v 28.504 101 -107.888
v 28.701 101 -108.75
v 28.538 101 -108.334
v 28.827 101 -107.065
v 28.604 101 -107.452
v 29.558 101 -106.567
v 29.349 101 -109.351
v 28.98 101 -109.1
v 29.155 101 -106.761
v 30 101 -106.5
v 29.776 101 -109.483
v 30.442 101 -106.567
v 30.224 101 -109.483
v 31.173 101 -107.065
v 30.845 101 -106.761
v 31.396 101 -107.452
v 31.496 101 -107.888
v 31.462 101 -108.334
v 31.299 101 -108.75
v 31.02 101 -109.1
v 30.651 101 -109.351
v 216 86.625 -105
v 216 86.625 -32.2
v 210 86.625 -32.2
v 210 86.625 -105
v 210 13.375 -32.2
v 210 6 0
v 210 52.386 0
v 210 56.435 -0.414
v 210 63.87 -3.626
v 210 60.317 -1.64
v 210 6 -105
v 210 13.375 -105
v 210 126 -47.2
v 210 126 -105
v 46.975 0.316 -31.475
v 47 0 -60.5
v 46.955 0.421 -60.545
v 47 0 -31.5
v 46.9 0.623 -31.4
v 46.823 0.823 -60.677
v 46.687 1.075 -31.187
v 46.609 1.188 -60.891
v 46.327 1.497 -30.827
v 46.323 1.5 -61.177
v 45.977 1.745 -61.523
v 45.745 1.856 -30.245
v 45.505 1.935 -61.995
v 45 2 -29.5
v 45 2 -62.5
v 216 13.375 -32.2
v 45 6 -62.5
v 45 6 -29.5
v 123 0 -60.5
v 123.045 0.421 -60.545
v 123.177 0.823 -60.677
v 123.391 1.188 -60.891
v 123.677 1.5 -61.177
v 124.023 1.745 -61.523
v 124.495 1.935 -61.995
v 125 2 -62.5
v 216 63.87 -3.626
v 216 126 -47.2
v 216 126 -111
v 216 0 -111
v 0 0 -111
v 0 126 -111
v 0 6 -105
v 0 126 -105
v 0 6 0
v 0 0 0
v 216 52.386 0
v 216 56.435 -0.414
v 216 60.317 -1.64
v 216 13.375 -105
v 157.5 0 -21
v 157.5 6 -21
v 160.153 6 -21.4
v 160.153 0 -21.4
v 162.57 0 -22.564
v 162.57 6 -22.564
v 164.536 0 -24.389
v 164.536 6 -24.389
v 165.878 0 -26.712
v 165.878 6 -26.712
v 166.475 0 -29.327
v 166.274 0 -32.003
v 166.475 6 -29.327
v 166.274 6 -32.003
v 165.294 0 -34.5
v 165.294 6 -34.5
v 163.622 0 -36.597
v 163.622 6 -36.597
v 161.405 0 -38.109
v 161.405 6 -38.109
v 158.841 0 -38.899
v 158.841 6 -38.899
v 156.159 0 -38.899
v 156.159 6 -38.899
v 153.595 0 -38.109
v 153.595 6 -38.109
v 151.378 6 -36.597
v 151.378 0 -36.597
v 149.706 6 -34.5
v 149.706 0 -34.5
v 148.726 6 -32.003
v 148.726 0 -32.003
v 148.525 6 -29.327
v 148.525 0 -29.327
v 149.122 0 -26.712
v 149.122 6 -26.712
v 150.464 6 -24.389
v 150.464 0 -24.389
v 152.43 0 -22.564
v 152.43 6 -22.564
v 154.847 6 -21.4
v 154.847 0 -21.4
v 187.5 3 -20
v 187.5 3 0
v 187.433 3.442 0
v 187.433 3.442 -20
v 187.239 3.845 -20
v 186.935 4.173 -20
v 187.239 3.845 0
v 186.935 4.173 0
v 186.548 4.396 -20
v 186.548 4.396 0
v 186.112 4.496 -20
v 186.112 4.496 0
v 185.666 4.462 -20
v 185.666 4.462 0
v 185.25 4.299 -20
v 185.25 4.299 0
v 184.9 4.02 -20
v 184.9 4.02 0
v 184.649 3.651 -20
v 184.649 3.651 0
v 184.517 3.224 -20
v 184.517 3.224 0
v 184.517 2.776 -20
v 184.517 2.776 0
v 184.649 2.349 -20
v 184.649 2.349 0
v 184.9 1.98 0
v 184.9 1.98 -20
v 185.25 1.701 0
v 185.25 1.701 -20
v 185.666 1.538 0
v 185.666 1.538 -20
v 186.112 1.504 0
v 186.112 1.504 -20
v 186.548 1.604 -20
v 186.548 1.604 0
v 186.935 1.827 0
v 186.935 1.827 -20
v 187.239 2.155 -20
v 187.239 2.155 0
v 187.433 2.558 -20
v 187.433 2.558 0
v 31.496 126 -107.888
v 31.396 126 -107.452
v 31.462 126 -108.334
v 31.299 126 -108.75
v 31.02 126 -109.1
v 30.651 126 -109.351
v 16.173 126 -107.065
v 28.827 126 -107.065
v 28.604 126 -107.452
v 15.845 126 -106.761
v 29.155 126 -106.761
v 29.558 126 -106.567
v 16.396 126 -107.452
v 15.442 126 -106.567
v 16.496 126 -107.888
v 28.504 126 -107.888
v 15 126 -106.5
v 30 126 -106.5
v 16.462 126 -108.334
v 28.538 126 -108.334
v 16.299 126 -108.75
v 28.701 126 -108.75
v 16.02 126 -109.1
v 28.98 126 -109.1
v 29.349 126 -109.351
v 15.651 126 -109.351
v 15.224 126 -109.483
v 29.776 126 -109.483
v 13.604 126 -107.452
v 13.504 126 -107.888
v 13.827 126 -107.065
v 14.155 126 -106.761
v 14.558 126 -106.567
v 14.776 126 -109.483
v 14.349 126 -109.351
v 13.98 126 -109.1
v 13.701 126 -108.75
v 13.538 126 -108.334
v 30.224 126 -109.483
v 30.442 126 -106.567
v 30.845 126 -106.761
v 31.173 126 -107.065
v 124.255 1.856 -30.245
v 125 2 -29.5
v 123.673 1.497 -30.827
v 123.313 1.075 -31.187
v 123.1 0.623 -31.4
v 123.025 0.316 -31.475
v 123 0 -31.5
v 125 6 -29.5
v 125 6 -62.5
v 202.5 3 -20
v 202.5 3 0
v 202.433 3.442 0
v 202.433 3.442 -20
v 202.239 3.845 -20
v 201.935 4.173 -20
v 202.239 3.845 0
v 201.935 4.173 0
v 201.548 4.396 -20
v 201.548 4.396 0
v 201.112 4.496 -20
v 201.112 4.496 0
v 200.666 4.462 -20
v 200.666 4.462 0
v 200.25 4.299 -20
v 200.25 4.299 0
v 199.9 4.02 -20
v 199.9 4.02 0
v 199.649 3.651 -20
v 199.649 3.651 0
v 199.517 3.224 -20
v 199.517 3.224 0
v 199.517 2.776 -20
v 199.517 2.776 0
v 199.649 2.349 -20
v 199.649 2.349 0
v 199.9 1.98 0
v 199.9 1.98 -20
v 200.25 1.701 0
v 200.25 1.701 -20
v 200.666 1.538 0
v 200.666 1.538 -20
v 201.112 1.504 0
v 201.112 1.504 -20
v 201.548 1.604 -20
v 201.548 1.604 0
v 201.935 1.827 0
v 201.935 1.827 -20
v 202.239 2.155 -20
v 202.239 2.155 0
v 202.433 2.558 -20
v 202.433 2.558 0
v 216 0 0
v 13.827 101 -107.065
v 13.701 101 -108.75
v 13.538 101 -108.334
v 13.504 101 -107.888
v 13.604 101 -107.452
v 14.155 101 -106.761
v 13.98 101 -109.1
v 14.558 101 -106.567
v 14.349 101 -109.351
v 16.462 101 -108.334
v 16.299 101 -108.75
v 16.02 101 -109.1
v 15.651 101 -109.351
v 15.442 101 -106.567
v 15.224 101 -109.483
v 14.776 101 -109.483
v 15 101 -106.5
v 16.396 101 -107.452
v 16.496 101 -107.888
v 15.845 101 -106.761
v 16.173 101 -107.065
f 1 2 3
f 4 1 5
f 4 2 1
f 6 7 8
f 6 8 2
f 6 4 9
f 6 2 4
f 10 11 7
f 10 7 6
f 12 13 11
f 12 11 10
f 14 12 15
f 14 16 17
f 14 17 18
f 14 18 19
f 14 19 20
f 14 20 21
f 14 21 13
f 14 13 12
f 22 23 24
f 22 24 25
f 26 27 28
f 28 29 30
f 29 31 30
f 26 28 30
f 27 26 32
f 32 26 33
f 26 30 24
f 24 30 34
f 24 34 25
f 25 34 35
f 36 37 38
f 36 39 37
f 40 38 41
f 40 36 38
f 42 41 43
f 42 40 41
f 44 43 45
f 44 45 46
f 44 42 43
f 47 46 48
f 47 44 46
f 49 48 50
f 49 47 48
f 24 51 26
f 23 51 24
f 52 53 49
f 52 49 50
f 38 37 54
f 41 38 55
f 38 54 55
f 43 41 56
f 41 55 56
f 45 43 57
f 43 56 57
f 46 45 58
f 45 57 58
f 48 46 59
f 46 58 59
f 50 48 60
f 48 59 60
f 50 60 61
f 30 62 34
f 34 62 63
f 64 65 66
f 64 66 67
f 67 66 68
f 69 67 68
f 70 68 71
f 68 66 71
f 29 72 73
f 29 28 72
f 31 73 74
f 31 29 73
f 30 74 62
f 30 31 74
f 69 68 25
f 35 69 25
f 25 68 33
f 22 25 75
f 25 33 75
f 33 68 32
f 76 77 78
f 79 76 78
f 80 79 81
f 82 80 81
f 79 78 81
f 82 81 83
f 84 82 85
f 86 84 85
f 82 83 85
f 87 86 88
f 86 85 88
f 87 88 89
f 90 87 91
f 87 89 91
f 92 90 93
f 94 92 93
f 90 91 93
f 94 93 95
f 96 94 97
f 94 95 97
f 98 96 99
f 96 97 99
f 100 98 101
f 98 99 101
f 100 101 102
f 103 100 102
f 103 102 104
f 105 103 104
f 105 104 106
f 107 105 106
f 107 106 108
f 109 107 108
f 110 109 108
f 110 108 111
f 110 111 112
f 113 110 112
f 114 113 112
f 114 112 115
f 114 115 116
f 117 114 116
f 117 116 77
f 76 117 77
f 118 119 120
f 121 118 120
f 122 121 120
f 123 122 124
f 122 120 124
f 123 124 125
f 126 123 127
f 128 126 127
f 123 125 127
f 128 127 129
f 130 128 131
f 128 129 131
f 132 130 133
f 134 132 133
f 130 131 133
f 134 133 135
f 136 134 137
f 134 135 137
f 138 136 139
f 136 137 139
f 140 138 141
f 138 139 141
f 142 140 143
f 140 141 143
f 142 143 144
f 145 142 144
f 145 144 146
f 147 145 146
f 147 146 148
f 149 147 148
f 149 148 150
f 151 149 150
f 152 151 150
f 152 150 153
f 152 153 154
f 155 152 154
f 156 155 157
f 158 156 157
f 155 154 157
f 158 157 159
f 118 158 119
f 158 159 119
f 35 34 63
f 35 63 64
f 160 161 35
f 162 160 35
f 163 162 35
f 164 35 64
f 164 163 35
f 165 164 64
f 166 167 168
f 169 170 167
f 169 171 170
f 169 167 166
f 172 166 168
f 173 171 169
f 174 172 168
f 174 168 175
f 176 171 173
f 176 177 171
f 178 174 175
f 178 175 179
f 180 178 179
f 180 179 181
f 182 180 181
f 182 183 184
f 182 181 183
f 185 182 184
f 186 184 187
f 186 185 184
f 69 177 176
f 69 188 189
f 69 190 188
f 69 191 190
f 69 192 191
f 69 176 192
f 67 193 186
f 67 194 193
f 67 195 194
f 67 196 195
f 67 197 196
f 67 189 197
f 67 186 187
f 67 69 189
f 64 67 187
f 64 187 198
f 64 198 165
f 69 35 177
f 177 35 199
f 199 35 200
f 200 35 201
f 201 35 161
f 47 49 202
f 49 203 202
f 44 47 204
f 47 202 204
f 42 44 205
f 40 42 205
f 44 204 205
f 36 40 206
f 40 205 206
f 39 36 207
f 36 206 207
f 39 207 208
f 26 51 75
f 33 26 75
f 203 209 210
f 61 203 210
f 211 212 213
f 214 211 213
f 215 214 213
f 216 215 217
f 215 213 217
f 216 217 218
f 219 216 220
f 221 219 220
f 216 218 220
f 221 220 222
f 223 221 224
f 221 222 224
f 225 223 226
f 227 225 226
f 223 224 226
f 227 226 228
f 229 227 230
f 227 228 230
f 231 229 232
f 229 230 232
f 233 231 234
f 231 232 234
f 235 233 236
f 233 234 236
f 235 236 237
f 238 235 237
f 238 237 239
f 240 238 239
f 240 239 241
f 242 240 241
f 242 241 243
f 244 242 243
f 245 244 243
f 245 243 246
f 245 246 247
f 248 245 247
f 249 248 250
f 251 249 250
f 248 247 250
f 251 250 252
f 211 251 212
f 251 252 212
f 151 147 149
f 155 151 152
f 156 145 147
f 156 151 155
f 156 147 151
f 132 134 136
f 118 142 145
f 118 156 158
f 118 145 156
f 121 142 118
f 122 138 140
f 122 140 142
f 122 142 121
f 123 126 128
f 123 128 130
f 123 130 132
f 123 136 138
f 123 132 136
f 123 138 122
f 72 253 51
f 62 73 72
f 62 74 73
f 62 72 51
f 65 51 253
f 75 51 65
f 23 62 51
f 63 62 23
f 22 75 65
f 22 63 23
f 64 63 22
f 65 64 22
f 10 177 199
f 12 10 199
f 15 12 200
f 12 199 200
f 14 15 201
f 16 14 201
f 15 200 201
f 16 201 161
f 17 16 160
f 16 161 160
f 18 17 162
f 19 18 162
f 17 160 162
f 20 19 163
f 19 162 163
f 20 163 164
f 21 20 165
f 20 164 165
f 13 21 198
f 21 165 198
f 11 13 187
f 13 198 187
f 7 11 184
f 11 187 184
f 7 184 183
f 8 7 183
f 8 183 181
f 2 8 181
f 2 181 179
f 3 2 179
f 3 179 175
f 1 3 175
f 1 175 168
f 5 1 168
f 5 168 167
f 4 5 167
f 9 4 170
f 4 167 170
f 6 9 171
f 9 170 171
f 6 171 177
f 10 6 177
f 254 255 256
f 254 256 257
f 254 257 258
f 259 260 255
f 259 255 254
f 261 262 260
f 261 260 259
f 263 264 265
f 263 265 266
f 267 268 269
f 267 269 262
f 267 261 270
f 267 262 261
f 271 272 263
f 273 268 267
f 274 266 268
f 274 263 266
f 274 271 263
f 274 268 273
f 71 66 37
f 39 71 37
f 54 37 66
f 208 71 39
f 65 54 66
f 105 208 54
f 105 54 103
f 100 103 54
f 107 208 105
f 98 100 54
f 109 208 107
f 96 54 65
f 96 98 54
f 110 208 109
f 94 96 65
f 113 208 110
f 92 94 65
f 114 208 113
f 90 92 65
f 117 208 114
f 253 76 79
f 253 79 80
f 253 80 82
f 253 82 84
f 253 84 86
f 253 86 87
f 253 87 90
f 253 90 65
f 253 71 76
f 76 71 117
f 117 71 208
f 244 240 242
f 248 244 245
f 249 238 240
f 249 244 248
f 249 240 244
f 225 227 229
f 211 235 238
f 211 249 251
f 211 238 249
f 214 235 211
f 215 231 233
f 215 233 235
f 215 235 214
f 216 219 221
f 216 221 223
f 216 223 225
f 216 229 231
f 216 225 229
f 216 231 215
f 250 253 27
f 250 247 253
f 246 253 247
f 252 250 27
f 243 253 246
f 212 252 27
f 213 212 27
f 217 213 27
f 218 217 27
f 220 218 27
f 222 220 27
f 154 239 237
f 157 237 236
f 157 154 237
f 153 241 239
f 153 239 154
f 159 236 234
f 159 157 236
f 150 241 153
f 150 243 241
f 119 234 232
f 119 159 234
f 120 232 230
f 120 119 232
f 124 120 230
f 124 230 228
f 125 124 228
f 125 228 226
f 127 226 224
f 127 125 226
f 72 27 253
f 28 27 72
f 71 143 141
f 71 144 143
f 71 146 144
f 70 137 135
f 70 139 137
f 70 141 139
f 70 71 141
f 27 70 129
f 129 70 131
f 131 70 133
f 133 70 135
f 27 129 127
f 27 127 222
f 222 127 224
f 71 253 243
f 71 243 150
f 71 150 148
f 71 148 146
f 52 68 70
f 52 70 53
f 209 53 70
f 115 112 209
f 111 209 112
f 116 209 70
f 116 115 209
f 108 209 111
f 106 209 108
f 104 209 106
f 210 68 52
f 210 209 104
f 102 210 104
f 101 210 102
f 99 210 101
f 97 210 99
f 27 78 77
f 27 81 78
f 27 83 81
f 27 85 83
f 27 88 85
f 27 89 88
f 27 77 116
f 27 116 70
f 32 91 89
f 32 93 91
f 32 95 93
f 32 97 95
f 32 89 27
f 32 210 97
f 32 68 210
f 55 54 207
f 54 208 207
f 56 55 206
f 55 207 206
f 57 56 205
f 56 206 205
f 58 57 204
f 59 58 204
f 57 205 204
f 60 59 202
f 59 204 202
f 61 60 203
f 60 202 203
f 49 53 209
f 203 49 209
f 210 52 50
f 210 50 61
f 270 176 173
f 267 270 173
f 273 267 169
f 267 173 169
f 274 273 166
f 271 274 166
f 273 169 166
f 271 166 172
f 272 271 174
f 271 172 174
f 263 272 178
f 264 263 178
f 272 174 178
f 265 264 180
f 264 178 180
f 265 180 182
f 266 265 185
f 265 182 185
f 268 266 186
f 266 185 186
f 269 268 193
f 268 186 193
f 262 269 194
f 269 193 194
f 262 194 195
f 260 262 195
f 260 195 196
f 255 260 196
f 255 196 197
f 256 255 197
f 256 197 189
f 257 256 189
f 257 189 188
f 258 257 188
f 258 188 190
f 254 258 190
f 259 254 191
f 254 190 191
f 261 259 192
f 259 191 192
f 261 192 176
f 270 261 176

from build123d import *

# Parameters (mm, degrees)
SKETCH1_W           = 210
SKETCH1_H           = 105
BOSS_EXTRUDE1_DEPTH = 6
SKETCH2_W           = 210
SKETCH2_H           = 6
BOSS_EXTRUDE2_DEPTH = 126
SKETCH3_W           = 111
SKETCH3_H           = 126
BOSS_EXTRUDE3_DEPTH = 6
CUT_EXTRUDE2_DEPTH  = 6
SKETCH7_R           = 9
CUT_EXTRUDE3_DEPTH  = 24
SKETCH8_W           = 72.8
SKETCH8_H           = 73.25
CUT_EXTRUDE4_DEPTH  = 24
SKETCH9_W           = 80
SKETCH9_H           = 33
CUT_EXTRUDE5_DEPTH  = 24
FILLET1_R           = 20
SKETCH11_W          = 80
SKETCH11_H          = 33
SKETCH11_W_2        = 76
SKETCH11_H_2        = 29
BOSS_EXTRUDE4_DEPTH = 2
FILLET2_R           = 2
SKETCH12_R          = 1.5
CUT_EXTRUDE6_DEPTH  = 20
SKETCH13_R          = 1.5
CUT_EXTRUDE7_DEPTH  = 25


with BuildPart() as part:
    # Sketch1 → Boss-Extrude1 (new body)
    with BuildSketch(Plane(origin=(0, 0, 0), x_dir=(1, 0, 0), z_dir=(0, 1, 0))):
        with Locations((105, 52.5)):
            Rectangle(SKETCH1_W, SKETCH1_H)
    extrude(amount=BOSS_EXTRUDE1_DEPTH)

    # Sketch2 → Boss-Extrude2 (add)
    with BuildSketch(Plane.XZ):
        with Locations((105, -108)):
            Rectangle(SKETCH2_W, SKETCH2_H)
    extrude(amount=-BOSS_EXTRUDE2_DEPTH)

    # Sketch3 → Boss-Extrude3 (add)
    with BuildSketch(Plane(origin=(210, 0, 0), x_dir=(0, 0, -1), z_dir=(1, 0, 0))):
        with Locations((55.5, 63)):
            Rectangle(SKETCH3_W, SKETCH3_H)
    extrude(amount=BOSS_EXTRUDE3_DEPTH)

    # Sketch6 → Cut-Extrude2 (cut)
    with BuildSketch(Plane(origin=(216, 0, 0), x_dir=(0, 0, -1), z_dir=(1, 0, 0))):
        Polygon((0, 58.7), (47.2, 126), (0, 126), align=None)
    extrude(amount=-CUT_EXTRUDE2_DEPTH, mode=Mode.SUBTRACT)

    # Sketch7 → Cut-Extrude3 (cut)
    with BuildSketch(Plane(origin=(0, 6, 0), x_dir=(1, 0, 0), z_dir=(0, 1, 0))):
        with Locations(Location((157.5, 30, 0), (0, 0, 270))):
            Circle(SKETCH7_R)
    extrude(amount=-CUT_EXTRUDE3_DEPTH, mode=Mode.SUBTRACT)

    # Sketch8 → Cut-Extrude4 (cut)
    with BuildSketch(Plane(origin=(216, 0, 0), x_dir=(0, 0, -1), z_dir=(1, 0, 0))):
        with Locations((68.6, 50)):
            Rectangle(SKETCH8_W, SKETCH8_H)
    extrude(amount=-CUT_EXTRUDE4_DEPTH, mode=Mode.SUBTRACT)

    # Sketch9 → Cut-Extrude5 (cut)
    with BuildSketch(Plane(origin=(0, 6, 0), x_dir=(1, 0, 0), z_dir=(0, 1, 0))):
        with Locations((85, 46)):
            Rectangle(SKETCH9_W, SKETCH9_H)
    extrude(amount=-CUT_EXTRUDE5_DEPTH, mode=Mode.SUBTRACT)

    # Fillet1
    fillet1_edges = [part.edges().sort_by_distance(p)[0] for p in [
        (213, 58.7, 0),
    ]]
    fillet(fillet1_edges, radius=FILLET1_R)

    # Sketch11 → Boss-Extrude4 (add)
    with BuildSketch(Plane.XZ):
        with Locations((85, -46)):
            Rectangle(SKETCH11_W, SKETCH11_H)
        with Locations((85, -46)):
            Rectangle(SKETCH11_W_2, SKETCH11_H_2, mode=Mode.SUBTRACT)
    extrude(amount=-BOSS_EXTRUDE4_DEPTH)

    # Fillet2
    fillet2_edges = [part.edges().sort_by_distance(p)[0] for p in [
        (85, 2, -31.5),
        (123, 2, -46),
        (85, 2, -60.5),
        (47, 2, -46),
    ]]
    fillet(fillet2_edges, radius=FILLET2_R - 0.0001)  # a hair under: the kernel refuses the full size

    # Sketch12 → Cut-Extrude6 (cut)
    with BuildSketch(Plane.XY):
        with Locations((201, 3)):
            Circle(SKETCH12_R)
        with Locations((186, 3)):
            Circle(SKETCH12_R)
    extrude(amount=-CUT_EXTRUDE6_DEPTH, mode=Mode.SUBTRACT)

    # Sketch13 → Cut-Extrude7 (cut)
    with BuildSketch(Plane(origin=(0, 126, 0), x_dir=(1, 0, 0), z_dir=(0, 1, 0))):
        with Locations(Location((15, 108, 0), (0, 0, 270))):
            Circle(SKETCH13_R)
        with Locations(Location((30, 108, 0), (0, 0, 270))):
            Circle(SKETCH13_R)
    extrude(amount=-CUT_EXTRUDE7_DEPTH, mode=Mode.SUBTRACT)


solid = part.part
